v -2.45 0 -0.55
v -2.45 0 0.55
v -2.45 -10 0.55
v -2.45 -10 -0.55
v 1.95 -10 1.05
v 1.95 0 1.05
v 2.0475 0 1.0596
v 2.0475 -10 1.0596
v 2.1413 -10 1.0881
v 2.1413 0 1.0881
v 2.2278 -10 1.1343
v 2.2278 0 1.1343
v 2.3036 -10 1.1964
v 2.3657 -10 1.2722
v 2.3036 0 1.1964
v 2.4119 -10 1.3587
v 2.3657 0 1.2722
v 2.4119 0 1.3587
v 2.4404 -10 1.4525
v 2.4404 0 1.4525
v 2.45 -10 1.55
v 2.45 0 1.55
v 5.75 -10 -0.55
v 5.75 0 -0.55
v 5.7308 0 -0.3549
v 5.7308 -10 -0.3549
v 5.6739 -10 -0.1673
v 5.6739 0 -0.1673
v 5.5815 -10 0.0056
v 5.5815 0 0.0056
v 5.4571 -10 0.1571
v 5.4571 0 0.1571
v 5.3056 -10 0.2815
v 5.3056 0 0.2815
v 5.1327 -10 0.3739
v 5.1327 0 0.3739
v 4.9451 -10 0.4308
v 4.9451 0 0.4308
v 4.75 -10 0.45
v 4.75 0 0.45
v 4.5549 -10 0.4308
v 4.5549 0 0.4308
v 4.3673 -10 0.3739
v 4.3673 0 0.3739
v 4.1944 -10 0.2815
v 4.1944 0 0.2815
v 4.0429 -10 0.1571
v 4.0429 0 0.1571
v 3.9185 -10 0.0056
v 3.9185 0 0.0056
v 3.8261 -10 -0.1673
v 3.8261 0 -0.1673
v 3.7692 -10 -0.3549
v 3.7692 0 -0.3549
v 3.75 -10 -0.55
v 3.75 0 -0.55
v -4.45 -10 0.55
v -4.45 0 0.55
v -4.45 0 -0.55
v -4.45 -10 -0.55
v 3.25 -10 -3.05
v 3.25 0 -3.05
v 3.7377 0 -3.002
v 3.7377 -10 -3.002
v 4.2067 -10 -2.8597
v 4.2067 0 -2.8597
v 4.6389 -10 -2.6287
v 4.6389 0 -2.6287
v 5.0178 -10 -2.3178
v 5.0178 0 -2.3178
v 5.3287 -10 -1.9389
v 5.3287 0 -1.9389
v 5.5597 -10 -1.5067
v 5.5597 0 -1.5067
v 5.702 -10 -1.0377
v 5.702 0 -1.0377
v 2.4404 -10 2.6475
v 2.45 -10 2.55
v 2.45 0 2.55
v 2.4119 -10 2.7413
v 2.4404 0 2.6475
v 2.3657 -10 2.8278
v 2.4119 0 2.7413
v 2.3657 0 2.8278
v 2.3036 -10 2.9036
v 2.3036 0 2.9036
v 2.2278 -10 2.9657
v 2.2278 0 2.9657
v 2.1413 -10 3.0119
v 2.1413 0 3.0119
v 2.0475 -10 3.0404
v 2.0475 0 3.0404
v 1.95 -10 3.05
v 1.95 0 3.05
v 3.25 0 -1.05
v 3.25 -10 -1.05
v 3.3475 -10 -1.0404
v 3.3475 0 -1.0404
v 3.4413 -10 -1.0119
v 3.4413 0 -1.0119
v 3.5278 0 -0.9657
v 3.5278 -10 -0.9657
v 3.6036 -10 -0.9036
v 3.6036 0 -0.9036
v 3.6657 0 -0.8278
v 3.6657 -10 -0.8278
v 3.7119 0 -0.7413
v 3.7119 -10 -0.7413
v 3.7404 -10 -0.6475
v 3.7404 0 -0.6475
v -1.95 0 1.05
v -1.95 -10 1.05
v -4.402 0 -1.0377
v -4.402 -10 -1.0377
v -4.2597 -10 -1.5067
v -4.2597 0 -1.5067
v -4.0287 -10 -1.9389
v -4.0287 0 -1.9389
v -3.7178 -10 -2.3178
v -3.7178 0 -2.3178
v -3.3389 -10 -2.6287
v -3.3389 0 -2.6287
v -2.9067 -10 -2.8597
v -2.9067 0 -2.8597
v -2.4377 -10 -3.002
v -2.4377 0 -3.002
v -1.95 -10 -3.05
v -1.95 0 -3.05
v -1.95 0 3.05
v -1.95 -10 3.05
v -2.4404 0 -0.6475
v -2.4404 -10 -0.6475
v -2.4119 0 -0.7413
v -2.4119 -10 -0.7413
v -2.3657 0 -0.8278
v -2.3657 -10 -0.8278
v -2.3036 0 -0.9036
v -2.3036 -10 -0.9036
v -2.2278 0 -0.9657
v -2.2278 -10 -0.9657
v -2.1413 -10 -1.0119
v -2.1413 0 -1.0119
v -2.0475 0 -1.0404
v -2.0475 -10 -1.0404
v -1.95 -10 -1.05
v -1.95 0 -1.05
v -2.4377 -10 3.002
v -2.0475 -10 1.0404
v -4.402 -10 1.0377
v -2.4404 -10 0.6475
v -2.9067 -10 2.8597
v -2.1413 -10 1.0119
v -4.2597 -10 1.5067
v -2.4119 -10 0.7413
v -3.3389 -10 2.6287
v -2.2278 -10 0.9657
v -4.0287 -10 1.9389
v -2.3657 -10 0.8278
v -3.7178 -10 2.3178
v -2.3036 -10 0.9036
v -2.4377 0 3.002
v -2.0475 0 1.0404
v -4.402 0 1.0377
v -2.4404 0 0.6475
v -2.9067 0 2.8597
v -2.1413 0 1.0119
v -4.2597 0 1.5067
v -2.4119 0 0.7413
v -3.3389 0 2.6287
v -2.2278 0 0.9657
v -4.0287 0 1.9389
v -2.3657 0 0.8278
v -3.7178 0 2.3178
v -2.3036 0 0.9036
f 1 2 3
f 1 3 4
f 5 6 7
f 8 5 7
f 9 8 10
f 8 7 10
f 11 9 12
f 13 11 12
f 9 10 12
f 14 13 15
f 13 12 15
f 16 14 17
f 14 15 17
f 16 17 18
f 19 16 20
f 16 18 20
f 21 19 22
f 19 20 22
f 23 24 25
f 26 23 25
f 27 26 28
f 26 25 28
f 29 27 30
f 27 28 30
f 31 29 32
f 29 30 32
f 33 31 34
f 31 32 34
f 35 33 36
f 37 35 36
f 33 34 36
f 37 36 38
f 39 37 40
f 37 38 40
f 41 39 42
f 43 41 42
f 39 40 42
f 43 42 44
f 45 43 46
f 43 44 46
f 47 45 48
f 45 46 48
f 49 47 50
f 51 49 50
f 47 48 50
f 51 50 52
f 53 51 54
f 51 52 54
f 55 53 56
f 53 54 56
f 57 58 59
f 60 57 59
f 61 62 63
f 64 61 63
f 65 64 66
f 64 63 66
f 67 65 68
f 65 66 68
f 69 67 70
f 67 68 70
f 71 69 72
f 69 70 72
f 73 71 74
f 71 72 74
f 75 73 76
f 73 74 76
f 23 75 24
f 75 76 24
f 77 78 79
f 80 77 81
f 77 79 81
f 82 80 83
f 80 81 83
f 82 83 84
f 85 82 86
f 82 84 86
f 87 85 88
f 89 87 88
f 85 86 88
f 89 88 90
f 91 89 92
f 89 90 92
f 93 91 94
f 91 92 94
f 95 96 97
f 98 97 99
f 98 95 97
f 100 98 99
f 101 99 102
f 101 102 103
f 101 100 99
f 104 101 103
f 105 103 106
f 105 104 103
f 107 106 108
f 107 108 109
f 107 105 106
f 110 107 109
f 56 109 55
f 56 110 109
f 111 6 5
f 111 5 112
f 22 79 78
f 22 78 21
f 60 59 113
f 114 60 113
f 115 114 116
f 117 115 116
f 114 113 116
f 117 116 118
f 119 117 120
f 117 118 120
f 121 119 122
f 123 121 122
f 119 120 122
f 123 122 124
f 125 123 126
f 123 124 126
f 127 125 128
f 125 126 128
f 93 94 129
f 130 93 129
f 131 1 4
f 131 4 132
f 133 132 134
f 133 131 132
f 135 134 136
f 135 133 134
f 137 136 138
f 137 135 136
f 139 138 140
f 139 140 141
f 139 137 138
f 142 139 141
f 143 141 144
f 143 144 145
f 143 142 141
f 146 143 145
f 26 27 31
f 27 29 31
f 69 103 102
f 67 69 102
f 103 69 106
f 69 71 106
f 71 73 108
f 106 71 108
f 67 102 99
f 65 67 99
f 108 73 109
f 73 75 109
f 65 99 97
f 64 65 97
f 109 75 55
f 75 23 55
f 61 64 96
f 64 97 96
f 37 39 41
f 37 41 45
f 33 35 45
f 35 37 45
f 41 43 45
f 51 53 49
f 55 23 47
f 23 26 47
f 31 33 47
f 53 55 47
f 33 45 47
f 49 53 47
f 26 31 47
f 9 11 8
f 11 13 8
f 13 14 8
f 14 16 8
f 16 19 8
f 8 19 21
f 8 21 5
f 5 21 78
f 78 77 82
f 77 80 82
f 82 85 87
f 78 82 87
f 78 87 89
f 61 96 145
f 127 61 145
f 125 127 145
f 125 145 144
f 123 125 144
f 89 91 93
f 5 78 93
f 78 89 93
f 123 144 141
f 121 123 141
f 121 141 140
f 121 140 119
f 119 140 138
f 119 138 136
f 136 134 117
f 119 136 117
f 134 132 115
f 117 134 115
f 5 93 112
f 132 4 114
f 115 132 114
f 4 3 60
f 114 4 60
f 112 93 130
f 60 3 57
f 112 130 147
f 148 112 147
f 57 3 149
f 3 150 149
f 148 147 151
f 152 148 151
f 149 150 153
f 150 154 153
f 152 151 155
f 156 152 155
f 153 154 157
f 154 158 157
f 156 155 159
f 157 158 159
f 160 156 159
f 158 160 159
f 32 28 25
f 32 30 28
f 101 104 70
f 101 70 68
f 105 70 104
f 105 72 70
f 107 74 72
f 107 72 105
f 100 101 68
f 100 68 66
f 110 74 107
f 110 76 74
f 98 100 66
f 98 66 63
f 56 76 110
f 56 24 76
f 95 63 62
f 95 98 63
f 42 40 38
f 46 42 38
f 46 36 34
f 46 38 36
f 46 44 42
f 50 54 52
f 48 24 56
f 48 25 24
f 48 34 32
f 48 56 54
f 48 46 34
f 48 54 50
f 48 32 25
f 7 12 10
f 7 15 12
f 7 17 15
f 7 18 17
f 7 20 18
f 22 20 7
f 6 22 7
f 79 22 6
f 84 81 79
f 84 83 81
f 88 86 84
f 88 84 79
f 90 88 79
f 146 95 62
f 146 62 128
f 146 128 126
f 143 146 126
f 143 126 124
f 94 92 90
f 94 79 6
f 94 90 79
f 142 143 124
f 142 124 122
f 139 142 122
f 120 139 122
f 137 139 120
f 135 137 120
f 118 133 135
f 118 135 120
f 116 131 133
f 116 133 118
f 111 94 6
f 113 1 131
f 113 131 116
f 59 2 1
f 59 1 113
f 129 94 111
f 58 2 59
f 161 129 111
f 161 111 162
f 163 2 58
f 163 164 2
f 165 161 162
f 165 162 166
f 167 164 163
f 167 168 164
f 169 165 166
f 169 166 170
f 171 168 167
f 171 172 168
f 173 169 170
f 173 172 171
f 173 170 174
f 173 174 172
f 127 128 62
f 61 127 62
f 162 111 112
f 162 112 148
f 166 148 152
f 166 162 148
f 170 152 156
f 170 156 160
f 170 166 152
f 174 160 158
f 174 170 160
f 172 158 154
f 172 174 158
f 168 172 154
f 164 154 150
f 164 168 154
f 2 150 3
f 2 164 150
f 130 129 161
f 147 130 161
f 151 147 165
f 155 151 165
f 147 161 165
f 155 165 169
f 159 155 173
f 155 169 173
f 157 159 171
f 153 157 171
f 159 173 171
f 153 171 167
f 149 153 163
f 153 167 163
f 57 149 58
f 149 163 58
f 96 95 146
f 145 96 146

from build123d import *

# Parameters (mm, degrees)
PAD_DEPTH = 10


with BuildPart() as part:
    # Sketch (on XZ_Plane of Origin) → Pad (new body)
    with BuildSketch(Plane.XZ):
        with BuildLine():
            Line((-2.45, 0.55), (-2.45, -0.55))
            ThreePointArc((-2.45, -0.55), (-2.303553, -0.903553), (-1.95, -1.05))
            Line((-1.95, -1.05), (1.95, -1.05))
            Line((3.25, -1.05), (1.95, -1.05))
            ThreePointArc((3.25, -1.05), (3.603553, -0.903553), (3.75, -0.55))
            ThreePointArc((5.75, -0.55), (4.75, 0.45), (3.75, -0.55))
            ThreePointArc((3.25, -3.05), (5.017767, -2.317767), (5.75, -0.55))
            Line((1.95, -3.05), (3.25, -3.05))
            Line((-1.95, -3.05), (1.95, -3.05))
            ThreePointArc((-4.45, -0.55), (-3.717767, -2.317767), (-1.95, -3.05))
            Line((-4.45, 0.55), (-4.45, -0.55))
            ThreePointArc((-1.95, 3.05), (-3.717767, 2.317767), (-4.45, 0.55))
            Line((1.95, 3.05), (-1.95, 3.05))
            ThreePointArc((2.45, 2.55), (2.303553, 2.903553), (1.95, 3.05))
            Line((2.45, 2.55), (2.45, 1.55))
            ThreePointArc((1.95, 1.05), (2.303553, 1.196447), (2.45, 1.55))
            Line((1.95, 1.05), (-1.95, 1.05))
            ThreePointArc((-1.95, 1.05), (-2.303553, 0.903553), (-2.45, 0.55))
        make_face()
    extrude(amount=PAD_DEPTH)


solid = part.part
